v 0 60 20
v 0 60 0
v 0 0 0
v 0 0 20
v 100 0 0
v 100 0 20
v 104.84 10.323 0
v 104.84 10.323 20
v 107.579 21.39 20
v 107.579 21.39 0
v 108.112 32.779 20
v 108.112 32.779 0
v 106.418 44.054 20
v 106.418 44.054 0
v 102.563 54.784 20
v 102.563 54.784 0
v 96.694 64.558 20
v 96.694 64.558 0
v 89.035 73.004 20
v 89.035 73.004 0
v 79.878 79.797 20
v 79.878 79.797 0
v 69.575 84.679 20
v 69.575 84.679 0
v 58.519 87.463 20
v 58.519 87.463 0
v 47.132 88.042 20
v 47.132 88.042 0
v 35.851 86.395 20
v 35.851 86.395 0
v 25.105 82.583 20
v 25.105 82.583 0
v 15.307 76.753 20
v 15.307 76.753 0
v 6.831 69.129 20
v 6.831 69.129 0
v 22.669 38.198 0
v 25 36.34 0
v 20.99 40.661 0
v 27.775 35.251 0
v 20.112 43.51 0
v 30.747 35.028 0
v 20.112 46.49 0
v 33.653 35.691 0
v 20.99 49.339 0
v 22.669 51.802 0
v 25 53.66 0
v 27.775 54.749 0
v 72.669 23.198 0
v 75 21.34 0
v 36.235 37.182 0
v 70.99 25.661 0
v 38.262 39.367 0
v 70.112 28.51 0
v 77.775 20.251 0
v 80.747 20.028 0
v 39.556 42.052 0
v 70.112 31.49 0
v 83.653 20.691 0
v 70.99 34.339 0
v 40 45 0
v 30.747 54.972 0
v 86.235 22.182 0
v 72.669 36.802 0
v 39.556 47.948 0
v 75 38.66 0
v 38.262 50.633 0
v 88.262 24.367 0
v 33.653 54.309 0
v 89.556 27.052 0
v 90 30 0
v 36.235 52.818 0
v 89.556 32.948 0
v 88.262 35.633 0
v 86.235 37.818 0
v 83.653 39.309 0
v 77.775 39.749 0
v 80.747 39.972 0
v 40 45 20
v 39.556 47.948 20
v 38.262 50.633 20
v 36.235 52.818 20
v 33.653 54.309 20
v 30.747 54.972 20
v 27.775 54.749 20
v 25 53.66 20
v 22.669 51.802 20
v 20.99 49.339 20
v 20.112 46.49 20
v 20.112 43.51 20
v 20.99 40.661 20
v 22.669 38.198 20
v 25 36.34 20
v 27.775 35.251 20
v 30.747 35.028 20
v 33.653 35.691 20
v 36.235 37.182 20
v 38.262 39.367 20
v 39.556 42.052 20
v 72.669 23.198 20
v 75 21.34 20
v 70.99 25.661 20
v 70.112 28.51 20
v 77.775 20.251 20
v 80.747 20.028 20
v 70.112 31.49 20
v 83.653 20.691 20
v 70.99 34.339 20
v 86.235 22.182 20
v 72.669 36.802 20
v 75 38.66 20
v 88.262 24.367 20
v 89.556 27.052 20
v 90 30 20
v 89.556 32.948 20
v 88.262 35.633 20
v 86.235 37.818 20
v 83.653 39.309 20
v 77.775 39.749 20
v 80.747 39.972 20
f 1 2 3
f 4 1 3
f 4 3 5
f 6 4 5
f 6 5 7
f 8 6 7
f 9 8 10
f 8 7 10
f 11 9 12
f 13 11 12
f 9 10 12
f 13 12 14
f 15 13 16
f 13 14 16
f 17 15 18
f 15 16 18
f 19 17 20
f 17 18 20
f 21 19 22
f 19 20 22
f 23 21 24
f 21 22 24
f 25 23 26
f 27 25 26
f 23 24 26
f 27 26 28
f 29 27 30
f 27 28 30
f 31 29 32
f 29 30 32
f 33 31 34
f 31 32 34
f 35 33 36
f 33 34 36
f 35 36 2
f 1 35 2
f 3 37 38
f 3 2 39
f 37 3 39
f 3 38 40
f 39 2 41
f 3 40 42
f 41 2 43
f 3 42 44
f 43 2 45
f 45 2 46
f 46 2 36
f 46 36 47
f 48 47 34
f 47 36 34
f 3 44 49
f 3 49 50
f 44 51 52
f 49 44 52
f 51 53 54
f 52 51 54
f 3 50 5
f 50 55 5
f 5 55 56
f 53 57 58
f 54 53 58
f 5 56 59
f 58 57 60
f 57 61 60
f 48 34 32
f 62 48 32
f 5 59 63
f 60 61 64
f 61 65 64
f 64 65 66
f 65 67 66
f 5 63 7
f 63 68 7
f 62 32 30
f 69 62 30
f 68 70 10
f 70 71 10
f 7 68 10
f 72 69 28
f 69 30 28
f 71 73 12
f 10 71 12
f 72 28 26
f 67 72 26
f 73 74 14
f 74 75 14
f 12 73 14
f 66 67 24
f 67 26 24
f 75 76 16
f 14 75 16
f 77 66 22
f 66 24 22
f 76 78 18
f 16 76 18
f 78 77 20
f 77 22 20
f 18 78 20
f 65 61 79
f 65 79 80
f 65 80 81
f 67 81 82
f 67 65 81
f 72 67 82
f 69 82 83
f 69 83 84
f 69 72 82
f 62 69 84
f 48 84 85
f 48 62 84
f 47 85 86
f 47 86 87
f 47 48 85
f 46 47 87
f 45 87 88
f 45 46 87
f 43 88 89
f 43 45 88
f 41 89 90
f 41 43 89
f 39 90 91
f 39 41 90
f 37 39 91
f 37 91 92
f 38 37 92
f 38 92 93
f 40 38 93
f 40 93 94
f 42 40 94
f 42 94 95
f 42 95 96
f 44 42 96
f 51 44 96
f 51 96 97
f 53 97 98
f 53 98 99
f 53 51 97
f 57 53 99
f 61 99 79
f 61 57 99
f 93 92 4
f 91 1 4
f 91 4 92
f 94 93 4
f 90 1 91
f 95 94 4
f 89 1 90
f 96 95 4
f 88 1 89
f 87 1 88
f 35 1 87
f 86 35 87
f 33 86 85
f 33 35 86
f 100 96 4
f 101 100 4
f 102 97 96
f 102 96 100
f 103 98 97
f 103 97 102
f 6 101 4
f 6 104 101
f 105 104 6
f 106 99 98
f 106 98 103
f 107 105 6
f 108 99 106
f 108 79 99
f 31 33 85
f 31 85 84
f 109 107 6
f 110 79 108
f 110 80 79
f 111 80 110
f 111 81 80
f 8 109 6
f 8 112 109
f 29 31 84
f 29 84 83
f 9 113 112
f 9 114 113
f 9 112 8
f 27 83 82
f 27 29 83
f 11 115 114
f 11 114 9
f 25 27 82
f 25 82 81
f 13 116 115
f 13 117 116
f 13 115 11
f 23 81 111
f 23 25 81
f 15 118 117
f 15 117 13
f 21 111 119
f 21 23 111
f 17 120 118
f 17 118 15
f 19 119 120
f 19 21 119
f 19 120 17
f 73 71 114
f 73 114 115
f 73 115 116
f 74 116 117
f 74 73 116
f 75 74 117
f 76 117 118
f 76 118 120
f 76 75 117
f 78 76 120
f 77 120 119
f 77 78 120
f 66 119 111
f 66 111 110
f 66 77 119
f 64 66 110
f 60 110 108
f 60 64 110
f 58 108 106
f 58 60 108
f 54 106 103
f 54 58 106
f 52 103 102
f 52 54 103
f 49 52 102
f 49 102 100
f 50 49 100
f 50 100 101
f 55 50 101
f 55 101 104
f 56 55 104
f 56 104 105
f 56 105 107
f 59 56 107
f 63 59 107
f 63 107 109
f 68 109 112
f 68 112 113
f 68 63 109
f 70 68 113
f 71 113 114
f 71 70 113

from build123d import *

# Parameters (mm, degrees)
F0_R     = 10
F1_DEPTH = 20


with BuildPart() as f1:
    # F0 (on Top) → F1 (new body)
    with BuildSketch(Plane.XY):
        with BuildLine():
            Line((0, 60), (0, 0))
            Line((0, 0), (100, 0))
            ThreePointArc((100, 0), (79.878387, 79.797312), (0, 60))
        make_face()
        with Locations((80, 30)):
            Circle(F0_R, mode=Mode.SUBTRACT)
        with Locations((30, 45)):
            Circle(F0_R, mode=Mode.SUBTRACT)
    extrude(amount=F1_DEPTH)


solid = f1.part
